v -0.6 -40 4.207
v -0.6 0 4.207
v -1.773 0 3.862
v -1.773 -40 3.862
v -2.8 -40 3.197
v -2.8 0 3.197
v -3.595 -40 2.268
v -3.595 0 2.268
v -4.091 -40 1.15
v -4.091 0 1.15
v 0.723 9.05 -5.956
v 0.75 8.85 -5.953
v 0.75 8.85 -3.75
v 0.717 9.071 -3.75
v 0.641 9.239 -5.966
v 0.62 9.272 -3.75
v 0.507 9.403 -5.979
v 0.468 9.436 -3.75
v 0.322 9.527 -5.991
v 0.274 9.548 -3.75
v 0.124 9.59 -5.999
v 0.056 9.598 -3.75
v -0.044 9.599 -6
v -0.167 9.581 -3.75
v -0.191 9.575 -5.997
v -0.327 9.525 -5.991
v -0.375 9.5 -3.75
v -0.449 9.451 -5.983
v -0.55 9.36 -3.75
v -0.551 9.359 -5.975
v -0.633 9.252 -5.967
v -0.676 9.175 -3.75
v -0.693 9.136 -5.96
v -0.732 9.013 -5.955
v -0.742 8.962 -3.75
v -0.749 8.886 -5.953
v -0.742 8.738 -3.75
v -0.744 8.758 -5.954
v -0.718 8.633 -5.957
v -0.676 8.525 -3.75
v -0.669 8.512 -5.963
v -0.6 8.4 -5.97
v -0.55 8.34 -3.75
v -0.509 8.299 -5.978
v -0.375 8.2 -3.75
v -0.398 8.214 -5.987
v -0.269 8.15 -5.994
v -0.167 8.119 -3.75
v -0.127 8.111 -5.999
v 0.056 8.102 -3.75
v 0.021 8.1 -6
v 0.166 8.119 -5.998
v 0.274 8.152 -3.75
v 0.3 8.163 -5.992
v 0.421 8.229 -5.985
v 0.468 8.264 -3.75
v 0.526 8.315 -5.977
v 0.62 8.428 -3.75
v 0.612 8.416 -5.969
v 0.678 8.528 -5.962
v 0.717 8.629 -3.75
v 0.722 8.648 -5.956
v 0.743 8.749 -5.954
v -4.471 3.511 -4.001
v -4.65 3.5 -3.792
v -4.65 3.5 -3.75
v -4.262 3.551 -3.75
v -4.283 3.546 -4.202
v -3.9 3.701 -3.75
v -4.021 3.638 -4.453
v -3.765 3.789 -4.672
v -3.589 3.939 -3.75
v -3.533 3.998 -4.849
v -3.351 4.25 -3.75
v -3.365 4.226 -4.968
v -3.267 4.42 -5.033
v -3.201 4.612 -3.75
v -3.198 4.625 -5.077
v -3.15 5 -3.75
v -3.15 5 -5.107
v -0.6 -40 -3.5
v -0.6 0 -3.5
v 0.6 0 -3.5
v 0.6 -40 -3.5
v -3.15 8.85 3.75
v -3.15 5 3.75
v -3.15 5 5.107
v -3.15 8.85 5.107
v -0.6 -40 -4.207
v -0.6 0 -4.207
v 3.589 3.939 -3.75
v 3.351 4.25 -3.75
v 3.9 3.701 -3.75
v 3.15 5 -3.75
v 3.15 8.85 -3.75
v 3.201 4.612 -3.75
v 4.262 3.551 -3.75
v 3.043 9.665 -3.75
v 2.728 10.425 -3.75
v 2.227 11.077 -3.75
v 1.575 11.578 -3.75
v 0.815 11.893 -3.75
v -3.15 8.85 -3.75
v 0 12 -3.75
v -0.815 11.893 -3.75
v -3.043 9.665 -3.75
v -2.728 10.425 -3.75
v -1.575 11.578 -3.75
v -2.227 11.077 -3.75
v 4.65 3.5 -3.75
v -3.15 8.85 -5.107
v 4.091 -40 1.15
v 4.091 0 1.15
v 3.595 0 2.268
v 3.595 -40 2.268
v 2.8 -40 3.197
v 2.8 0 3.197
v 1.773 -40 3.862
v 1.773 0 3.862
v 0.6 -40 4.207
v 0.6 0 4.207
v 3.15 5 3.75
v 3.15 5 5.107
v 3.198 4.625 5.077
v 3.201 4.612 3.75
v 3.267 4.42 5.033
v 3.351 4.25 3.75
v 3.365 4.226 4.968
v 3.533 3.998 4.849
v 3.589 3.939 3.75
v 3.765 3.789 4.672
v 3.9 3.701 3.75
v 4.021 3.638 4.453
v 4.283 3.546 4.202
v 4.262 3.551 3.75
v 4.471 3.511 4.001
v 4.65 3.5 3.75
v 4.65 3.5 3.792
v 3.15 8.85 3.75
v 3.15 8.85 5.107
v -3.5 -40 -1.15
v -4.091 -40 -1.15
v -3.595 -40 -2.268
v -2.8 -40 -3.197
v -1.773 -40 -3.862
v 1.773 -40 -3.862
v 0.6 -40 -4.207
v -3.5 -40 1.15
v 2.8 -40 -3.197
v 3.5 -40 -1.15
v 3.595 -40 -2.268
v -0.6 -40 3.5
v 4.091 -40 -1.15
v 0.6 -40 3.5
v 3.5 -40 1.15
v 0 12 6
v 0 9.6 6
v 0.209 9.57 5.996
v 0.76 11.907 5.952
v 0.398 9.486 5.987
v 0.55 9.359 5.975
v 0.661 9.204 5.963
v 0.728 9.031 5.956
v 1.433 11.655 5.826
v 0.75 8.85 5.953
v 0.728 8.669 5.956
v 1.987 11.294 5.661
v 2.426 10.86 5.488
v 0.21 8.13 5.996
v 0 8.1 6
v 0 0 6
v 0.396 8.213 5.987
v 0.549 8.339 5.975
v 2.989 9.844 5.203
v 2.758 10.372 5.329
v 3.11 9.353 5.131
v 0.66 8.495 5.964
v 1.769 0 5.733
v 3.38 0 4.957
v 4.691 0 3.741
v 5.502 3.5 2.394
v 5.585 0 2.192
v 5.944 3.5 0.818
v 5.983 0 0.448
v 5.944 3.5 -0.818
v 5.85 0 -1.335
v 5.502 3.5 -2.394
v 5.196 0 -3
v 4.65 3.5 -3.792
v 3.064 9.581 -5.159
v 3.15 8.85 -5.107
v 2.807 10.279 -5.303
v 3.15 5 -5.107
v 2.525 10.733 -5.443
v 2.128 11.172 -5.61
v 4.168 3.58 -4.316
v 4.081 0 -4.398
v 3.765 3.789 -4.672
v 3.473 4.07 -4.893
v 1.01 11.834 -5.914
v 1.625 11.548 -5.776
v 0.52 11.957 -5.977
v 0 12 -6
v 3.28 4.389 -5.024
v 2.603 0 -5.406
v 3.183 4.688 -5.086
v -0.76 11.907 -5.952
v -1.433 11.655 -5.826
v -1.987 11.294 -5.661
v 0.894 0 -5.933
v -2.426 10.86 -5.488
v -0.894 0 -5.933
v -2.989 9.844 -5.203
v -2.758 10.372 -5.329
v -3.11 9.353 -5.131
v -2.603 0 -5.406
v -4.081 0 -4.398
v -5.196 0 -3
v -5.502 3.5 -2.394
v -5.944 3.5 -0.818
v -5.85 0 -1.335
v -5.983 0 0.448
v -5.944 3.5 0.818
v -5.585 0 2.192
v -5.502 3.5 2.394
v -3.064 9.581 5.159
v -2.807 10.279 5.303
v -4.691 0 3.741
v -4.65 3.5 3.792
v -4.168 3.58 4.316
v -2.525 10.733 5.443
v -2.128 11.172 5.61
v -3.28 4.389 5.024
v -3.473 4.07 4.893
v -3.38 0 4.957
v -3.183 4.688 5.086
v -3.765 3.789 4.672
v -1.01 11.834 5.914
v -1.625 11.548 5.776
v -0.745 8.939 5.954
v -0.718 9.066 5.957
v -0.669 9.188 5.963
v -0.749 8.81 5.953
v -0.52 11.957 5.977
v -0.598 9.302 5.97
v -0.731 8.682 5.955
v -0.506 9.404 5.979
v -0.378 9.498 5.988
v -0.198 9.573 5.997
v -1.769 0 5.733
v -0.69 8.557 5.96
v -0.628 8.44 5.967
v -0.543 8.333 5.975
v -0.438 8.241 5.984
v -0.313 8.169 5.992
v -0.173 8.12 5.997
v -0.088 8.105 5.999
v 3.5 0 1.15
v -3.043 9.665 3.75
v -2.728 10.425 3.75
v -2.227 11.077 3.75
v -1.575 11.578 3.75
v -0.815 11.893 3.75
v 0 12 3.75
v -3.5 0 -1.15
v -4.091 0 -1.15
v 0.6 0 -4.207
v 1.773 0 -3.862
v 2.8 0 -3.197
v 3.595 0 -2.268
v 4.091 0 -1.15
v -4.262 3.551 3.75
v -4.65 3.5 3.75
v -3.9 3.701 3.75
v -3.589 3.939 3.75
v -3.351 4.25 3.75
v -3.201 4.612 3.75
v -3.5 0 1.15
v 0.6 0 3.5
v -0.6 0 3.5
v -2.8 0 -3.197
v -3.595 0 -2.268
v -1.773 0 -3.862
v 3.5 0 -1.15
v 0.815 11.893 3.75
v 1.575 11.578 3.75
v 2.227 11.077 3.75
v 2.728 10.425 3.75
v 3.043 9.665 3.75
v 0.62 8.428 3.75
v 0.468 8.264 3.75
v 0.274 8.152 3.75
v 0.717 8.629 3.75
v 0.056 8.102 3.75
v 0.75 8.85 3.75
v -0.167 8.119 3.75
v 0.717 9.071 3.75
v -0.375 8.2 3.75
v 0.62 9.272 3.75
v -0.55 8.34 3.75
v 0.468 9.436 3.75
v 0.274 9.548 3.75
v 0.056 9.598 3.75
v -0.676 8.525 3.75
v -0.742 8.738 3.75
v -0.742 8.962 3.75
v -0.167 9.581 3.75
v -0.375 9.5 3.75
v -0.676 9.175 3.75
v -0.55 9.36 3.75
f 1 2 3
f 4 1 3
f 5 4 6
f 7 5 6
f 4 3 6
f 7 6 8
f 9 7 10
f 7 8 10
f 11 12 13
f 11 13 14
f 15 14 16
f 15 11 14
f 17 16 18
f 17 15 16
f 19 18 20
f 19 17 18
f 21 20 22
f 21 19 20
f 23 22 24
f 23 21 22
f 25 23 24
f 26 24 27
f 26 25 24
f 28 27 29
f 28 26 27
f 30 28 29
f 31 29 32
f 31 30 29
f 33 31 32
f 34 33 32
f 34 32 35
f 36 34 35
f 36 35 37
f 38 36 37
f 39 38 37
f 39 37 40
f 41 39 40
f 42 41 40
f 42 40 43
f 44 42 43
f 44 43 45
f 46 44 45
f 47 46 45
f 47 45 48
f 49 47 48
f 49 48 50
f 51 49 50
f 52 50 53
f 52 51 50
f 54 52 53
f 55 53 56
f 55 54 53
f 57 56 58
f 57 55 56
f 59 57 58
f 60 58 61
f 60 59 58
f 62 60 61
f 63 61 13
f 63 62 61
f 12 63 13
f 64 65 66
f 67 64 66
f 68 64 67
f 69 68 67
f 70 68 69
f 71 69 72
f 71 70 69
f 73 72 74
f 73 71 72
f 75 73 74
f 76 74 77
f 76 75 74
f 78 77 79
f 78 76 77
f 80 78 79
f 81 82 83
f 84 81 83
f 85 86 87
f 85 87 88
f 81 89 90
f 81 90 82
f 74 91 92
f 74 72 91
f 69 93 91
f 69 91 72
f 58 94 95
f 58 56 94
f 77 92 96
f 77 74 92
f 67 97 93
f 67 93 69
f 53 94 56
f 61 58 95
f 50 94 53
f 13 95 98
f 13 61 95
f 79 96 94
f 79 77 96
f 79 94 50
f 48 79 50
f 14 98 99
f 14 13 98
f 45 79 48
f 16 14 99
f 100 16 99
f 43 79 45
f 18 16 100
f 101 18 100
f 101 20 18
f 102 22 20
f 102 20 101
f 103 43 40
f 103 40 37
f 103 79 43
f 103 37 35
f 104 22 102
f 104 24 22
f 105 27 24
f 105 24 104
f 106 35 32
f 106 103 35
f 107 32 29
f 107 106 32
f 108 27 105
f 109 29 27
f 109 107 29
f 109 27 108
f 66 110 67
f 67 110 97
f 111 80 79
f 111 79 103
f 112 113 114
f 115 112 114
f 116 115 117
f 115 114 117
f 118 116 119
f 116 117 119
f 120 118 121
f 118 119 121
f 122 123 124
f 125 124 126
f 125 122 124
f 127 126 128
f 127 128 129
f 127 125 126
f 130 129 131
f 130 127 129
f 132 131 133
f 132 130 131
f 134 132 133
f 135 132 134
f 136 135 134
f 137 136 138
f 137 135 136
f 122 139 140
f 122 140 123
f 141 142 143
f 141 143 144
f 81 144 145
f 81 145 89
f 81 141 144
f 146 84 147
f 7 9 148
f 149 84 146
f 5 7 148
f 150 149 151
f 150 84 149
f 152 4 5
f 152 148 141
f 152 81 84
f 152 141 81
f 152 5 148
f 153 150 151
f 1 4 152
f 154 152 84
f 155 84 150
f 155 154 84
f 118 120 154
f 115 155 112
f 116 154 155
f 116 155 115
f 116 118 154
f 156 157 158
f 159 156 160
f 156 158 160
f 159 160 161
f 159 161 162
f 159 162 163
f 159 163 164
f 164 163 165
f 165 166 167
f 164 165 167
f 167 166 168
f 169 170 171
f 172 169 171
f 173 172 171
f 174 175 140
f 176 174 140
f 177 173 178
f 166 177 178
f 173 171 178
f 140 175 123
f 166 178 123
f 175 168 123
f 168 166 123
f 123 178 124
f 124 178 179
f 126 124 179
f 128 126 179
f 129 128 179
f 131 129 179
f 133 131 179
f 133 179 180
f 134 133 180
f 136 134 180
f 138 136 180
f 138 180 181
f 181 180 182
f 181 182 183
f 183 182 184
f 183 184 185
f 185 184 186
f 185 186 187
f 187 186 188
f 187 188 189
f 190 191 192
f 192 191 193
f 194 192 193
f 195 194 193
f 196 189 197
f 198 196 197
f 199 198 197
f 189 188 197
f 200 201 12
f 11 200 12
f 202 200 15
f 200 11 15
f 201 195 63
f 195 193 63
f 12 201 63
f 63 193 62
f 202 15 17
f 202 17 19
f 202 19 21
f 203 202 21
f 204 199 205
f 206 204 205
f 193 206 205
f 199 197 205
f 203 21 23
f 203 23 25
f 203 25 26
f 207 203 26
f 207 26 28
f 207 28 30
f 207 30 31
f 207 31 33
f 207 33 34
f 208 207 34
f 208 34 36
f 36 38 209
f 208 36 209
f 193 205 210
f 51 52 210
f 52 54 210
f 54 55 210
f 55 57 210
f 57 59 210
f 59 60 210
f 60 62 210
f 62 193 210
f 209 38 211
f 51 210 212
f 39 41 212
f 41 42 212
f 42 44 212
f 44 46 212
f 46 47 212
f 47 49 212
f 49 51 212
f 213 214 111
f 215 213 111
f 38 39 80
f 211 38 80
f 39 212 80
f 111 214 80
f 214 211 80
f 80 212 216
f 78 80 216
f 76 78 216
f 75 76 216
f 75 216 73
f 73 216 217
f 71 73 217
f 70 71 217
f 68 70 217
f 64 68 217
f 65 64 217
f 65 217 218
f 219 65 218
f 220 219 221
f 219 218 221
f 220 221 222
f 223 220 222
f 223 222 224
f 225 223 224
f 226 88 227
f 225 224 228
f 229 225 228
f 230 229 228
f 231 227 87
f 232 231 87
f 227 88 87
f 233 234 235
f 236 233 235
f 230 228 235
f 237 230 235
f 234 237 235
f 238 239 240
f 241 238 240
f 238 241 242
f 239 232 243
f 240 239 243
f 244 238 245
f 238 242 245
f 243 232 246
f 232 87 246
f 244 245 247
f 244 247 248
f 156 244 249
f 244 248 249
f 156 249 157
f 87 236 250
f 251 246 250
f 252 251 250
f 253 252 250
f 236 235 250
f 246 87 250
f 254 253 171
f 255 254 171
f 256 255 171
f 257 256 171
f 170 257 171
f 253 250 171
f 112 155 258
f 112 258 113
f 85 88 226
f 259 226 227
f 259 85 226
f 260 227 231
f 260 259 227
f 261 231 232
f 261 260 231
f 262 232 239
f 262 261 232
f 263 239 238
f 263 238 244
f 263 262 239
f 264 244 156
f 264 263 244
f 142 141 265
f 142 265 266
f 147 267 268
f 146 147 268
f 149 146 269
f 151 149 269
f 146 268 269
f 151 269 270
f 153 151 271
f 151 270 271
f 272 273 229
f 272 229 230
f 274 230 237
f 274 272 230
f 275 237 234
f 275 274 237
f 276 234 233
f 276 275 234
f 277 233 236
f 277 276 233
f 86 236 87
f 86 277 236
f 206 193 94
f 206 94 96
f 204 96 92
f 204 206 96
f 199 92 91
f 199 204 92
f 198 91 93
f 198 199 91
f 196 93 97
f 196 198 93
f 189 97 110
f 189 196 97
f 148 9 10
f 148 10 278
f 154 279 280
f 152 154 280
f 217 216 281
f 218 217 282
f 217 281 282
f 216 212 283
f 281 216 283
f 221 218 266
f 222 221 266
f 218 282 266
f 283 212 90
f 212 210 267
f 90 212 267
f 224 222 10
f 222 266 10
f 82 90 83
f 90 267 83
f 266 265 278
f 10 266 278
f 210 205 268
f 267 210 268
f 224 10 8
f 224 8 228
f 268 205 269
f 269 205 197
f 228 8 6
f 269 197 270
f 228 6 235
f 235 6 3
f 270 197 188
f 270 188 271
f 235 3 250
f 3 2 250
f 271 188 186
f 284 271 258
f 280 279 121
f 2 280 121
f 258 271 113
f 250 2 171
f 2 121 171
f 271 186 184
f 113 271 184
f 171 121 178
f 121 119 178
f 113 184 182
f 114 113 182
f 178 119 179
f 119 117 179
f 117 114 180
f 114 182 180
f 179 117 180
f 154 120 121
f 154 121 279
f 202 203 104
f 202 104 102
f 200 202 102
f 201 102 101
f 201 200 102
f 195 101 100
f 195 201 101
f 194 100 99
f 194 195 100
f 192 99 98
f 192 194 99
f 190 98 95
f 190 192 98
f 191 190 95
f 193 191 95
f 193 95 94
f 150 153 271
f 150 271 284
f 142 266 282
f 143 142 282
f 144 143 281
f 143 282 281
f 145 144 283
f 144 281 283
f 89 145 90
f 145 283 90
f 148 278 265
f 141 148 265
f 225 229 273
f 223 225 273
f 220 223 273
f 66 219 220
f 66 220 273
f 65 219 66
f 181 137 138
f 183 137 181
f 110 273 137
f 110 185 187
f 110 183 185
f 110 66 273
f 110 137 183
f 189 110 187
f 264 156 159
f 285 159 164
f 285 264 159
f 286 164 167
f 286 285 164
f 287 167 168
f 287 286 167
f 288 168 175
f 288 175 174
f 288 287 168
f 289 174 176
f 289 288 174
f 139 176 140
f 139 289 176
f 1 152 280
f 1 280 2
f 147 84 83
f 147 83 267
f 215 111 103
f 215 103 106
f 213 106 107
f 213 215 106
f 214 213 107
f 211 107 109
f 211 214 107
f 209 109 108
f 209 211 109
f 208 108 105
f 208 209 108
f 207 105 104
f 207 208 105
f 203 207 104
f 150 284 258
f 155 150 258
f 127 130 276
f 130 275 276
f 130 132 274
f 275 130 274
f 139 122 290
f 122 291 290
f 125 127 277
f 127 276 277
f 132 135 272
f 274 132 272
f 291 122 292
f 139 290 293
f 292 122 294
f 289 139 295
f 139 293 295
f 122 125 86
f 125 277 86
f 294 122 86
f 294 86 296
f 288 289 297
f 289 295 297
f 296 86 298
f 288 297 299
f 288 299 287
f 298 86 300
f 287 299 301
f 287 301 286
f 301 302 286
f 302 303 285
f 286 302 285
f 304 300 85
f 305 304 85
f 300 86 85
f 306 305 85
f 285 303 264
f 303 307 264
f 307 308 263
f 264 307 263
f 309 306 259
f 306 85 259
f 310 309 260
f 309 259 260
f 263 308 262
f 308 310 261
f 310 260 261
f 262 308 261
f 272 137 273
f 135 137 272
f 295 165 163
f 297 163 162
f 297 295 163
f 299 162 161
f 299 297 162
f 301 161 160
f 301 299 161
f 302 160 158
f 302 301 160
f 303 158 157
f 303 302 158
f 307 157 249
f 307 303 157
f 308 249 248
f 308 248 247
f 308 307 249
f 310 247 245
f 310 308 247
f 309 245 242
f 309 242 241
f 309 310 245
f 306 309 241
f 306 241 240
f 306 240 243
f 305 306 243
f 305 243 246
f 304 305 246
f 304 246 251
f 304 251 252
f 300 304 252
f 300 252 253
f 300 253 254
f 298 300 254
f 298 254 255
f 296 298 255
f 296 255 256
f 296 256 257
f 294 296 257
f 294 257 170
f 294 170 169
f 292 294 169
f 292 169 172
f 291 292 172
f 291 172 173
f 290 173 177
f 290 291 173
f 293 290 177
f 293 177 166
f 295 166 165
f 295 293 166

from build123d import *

# Parameters (mm, degrees)
SKETCH1_R               = 6
BOSS_EXTRUDE1_DEPTH     = 12
CUT_EXTRUDE1_DEPTH      = 15.696938457
CUT_EXTRUDE1_DEPTH_BACK = 15.696938457
SKETCH2_W               = 7.5
SKETCH2_H               = 8.5
CUT_EXTRUDE2_DEPTH      = 15.696938457
CUT_EXTRUDE2_DEPTH_BACK = 15.696938457
SKETCH3_R               = 0.75
BOSS_EXTRUDE2_DEPTH     = 40


with BuildPart() as part:
    # Sketch1 → Boss-Extrude1 (new body)
    with BuildSketch(Plane(origin=(0, 0, 0), x_dir=(1, 0, 0), z_dir=(0, 1, 0))):
        with Locations(Location((0, 0, 0), (0, 0, 270))):
            Circle(SKETCH1_R)
    extrude(amount=BOSS_EXTRUDE1_DEPTH)

    # Sketch2 → Cut-Extrude1 (cut, two sides: drawn at the far end of the back side and taken through both)
    with BuildSketch(Plane(origin=(0, 0, 0), x_dir=(0, 0, -1), z_dir=(1, 0, 0)).offset(-CUT_EXTRUDE1_DEPTH_BACK)):
        with Locations((0, 7.75)):
            Rectangle(SKETCH2_W, SKETCH2_H)
    extrude(amount=CUT_EXTRUDE1_DEPTH + CUT_EXTRUDE1_DEPTH_BACK, mode=Mode.SUBTRACT)

    # Sketch3 → Cut-Extrude2 (cut, two sides: drawn at the far end of the back side and taken through both)
    with BuildSketch(Plane.XY.offset(-CUT_EXTRUDE2_DEPTH_BACK)):
        with BuildLine():
            Line((-3.15, 5), (-3.15, 8.85))
            ThreePointArc((-3.15, 8.85), (-2.227386361, 11.077386361), (0, 12))
            Line((0, 12), (-4.683748499, 12))
            Line((-4.683748499, 12), (-4.683748499, 3.5))
            Line((-4.683748499, 3.5), (-4.65, 3.5))
            ThreePointArc((-4.65, 3.5), (-3.589339828, 3.939339828), (-3.15, 5))
        make_face()
        with BuildLine():
            Line((4.683748499, 12), (0, 12))
            ThreePointArc((0, 12), (2.227386361, 11.077386361), (3.15, 8.85))
            Line((3.15, 8.85), (3.15, 5))
            ThreePointArc((3.15, 5), (3.589339828, 3.939339828), (4.65, 3.5))
            Line((4.65, 3.5), (4.683748499, 3.5))
            Line((4.683748499, 3.5), (4.683748499, 12))
        make_face()
        with Locations((0, 8.85)):
            Circle(SKETCH3_R)
    extrude(amount=CUT_EXTRUDE2_DEPTH + CUT_EXTRUDE2_DEPTH_BACK, mode=Mode.SUBTRACT)

    # Sketch4 → Boss-Extrude2 (add)
    with BuildSketch(Plane.XZ):
        with BuildLine():
            Line((-0.6, 3.5), (-0.6, 4.207433897))
            ThreePointArc((-0.6, 4.207433897), (-2.799894973, 3.19735643), (-4.091454509, 1.15))
            Line((-4.091454509, 1.15), (-3.5, 1.15))
            Line((-3.5, 1.15), (-3.5, -1.15))
            Line((-3.5, -1.15), (-4.091454509, -1.15))
            ThreePointArc((-4.091454509, -1.15), (-2.799894973, -3.19735643), (-0.6, -4.207433897))
            Line((-0.6, -4.207433897), (-0.6, -3.5))
            Line((-0.6, -3.5), (0.6, -3.5))
            Line((0.6, -3.5), (0.6, -4.207433897))
            ThreePointArc((0.6, -4.207433897), (2.799894973, -3.19735643), (4.091454509, -1.15))
            Line((4.091454509, -1.15), (3.5, -1.15))
            Line((3.5, -1.15), (3.5, 1.15))
            Line((3.5, 1.15), (4.091454509, 1.15))
            ThreePointArc((4.091454509, 1.15), (2.799894973, 3.19735643), (0.6, 4.207433897))
            Line((0.6, 4.207433897), (0.6, 3.5))
            Line((0.6, 3.5), (-0.6, 3.5))
        make_face()
    extrude(amount=BOSS_EXTRUDE2_DEPTH)


solid = part.part
